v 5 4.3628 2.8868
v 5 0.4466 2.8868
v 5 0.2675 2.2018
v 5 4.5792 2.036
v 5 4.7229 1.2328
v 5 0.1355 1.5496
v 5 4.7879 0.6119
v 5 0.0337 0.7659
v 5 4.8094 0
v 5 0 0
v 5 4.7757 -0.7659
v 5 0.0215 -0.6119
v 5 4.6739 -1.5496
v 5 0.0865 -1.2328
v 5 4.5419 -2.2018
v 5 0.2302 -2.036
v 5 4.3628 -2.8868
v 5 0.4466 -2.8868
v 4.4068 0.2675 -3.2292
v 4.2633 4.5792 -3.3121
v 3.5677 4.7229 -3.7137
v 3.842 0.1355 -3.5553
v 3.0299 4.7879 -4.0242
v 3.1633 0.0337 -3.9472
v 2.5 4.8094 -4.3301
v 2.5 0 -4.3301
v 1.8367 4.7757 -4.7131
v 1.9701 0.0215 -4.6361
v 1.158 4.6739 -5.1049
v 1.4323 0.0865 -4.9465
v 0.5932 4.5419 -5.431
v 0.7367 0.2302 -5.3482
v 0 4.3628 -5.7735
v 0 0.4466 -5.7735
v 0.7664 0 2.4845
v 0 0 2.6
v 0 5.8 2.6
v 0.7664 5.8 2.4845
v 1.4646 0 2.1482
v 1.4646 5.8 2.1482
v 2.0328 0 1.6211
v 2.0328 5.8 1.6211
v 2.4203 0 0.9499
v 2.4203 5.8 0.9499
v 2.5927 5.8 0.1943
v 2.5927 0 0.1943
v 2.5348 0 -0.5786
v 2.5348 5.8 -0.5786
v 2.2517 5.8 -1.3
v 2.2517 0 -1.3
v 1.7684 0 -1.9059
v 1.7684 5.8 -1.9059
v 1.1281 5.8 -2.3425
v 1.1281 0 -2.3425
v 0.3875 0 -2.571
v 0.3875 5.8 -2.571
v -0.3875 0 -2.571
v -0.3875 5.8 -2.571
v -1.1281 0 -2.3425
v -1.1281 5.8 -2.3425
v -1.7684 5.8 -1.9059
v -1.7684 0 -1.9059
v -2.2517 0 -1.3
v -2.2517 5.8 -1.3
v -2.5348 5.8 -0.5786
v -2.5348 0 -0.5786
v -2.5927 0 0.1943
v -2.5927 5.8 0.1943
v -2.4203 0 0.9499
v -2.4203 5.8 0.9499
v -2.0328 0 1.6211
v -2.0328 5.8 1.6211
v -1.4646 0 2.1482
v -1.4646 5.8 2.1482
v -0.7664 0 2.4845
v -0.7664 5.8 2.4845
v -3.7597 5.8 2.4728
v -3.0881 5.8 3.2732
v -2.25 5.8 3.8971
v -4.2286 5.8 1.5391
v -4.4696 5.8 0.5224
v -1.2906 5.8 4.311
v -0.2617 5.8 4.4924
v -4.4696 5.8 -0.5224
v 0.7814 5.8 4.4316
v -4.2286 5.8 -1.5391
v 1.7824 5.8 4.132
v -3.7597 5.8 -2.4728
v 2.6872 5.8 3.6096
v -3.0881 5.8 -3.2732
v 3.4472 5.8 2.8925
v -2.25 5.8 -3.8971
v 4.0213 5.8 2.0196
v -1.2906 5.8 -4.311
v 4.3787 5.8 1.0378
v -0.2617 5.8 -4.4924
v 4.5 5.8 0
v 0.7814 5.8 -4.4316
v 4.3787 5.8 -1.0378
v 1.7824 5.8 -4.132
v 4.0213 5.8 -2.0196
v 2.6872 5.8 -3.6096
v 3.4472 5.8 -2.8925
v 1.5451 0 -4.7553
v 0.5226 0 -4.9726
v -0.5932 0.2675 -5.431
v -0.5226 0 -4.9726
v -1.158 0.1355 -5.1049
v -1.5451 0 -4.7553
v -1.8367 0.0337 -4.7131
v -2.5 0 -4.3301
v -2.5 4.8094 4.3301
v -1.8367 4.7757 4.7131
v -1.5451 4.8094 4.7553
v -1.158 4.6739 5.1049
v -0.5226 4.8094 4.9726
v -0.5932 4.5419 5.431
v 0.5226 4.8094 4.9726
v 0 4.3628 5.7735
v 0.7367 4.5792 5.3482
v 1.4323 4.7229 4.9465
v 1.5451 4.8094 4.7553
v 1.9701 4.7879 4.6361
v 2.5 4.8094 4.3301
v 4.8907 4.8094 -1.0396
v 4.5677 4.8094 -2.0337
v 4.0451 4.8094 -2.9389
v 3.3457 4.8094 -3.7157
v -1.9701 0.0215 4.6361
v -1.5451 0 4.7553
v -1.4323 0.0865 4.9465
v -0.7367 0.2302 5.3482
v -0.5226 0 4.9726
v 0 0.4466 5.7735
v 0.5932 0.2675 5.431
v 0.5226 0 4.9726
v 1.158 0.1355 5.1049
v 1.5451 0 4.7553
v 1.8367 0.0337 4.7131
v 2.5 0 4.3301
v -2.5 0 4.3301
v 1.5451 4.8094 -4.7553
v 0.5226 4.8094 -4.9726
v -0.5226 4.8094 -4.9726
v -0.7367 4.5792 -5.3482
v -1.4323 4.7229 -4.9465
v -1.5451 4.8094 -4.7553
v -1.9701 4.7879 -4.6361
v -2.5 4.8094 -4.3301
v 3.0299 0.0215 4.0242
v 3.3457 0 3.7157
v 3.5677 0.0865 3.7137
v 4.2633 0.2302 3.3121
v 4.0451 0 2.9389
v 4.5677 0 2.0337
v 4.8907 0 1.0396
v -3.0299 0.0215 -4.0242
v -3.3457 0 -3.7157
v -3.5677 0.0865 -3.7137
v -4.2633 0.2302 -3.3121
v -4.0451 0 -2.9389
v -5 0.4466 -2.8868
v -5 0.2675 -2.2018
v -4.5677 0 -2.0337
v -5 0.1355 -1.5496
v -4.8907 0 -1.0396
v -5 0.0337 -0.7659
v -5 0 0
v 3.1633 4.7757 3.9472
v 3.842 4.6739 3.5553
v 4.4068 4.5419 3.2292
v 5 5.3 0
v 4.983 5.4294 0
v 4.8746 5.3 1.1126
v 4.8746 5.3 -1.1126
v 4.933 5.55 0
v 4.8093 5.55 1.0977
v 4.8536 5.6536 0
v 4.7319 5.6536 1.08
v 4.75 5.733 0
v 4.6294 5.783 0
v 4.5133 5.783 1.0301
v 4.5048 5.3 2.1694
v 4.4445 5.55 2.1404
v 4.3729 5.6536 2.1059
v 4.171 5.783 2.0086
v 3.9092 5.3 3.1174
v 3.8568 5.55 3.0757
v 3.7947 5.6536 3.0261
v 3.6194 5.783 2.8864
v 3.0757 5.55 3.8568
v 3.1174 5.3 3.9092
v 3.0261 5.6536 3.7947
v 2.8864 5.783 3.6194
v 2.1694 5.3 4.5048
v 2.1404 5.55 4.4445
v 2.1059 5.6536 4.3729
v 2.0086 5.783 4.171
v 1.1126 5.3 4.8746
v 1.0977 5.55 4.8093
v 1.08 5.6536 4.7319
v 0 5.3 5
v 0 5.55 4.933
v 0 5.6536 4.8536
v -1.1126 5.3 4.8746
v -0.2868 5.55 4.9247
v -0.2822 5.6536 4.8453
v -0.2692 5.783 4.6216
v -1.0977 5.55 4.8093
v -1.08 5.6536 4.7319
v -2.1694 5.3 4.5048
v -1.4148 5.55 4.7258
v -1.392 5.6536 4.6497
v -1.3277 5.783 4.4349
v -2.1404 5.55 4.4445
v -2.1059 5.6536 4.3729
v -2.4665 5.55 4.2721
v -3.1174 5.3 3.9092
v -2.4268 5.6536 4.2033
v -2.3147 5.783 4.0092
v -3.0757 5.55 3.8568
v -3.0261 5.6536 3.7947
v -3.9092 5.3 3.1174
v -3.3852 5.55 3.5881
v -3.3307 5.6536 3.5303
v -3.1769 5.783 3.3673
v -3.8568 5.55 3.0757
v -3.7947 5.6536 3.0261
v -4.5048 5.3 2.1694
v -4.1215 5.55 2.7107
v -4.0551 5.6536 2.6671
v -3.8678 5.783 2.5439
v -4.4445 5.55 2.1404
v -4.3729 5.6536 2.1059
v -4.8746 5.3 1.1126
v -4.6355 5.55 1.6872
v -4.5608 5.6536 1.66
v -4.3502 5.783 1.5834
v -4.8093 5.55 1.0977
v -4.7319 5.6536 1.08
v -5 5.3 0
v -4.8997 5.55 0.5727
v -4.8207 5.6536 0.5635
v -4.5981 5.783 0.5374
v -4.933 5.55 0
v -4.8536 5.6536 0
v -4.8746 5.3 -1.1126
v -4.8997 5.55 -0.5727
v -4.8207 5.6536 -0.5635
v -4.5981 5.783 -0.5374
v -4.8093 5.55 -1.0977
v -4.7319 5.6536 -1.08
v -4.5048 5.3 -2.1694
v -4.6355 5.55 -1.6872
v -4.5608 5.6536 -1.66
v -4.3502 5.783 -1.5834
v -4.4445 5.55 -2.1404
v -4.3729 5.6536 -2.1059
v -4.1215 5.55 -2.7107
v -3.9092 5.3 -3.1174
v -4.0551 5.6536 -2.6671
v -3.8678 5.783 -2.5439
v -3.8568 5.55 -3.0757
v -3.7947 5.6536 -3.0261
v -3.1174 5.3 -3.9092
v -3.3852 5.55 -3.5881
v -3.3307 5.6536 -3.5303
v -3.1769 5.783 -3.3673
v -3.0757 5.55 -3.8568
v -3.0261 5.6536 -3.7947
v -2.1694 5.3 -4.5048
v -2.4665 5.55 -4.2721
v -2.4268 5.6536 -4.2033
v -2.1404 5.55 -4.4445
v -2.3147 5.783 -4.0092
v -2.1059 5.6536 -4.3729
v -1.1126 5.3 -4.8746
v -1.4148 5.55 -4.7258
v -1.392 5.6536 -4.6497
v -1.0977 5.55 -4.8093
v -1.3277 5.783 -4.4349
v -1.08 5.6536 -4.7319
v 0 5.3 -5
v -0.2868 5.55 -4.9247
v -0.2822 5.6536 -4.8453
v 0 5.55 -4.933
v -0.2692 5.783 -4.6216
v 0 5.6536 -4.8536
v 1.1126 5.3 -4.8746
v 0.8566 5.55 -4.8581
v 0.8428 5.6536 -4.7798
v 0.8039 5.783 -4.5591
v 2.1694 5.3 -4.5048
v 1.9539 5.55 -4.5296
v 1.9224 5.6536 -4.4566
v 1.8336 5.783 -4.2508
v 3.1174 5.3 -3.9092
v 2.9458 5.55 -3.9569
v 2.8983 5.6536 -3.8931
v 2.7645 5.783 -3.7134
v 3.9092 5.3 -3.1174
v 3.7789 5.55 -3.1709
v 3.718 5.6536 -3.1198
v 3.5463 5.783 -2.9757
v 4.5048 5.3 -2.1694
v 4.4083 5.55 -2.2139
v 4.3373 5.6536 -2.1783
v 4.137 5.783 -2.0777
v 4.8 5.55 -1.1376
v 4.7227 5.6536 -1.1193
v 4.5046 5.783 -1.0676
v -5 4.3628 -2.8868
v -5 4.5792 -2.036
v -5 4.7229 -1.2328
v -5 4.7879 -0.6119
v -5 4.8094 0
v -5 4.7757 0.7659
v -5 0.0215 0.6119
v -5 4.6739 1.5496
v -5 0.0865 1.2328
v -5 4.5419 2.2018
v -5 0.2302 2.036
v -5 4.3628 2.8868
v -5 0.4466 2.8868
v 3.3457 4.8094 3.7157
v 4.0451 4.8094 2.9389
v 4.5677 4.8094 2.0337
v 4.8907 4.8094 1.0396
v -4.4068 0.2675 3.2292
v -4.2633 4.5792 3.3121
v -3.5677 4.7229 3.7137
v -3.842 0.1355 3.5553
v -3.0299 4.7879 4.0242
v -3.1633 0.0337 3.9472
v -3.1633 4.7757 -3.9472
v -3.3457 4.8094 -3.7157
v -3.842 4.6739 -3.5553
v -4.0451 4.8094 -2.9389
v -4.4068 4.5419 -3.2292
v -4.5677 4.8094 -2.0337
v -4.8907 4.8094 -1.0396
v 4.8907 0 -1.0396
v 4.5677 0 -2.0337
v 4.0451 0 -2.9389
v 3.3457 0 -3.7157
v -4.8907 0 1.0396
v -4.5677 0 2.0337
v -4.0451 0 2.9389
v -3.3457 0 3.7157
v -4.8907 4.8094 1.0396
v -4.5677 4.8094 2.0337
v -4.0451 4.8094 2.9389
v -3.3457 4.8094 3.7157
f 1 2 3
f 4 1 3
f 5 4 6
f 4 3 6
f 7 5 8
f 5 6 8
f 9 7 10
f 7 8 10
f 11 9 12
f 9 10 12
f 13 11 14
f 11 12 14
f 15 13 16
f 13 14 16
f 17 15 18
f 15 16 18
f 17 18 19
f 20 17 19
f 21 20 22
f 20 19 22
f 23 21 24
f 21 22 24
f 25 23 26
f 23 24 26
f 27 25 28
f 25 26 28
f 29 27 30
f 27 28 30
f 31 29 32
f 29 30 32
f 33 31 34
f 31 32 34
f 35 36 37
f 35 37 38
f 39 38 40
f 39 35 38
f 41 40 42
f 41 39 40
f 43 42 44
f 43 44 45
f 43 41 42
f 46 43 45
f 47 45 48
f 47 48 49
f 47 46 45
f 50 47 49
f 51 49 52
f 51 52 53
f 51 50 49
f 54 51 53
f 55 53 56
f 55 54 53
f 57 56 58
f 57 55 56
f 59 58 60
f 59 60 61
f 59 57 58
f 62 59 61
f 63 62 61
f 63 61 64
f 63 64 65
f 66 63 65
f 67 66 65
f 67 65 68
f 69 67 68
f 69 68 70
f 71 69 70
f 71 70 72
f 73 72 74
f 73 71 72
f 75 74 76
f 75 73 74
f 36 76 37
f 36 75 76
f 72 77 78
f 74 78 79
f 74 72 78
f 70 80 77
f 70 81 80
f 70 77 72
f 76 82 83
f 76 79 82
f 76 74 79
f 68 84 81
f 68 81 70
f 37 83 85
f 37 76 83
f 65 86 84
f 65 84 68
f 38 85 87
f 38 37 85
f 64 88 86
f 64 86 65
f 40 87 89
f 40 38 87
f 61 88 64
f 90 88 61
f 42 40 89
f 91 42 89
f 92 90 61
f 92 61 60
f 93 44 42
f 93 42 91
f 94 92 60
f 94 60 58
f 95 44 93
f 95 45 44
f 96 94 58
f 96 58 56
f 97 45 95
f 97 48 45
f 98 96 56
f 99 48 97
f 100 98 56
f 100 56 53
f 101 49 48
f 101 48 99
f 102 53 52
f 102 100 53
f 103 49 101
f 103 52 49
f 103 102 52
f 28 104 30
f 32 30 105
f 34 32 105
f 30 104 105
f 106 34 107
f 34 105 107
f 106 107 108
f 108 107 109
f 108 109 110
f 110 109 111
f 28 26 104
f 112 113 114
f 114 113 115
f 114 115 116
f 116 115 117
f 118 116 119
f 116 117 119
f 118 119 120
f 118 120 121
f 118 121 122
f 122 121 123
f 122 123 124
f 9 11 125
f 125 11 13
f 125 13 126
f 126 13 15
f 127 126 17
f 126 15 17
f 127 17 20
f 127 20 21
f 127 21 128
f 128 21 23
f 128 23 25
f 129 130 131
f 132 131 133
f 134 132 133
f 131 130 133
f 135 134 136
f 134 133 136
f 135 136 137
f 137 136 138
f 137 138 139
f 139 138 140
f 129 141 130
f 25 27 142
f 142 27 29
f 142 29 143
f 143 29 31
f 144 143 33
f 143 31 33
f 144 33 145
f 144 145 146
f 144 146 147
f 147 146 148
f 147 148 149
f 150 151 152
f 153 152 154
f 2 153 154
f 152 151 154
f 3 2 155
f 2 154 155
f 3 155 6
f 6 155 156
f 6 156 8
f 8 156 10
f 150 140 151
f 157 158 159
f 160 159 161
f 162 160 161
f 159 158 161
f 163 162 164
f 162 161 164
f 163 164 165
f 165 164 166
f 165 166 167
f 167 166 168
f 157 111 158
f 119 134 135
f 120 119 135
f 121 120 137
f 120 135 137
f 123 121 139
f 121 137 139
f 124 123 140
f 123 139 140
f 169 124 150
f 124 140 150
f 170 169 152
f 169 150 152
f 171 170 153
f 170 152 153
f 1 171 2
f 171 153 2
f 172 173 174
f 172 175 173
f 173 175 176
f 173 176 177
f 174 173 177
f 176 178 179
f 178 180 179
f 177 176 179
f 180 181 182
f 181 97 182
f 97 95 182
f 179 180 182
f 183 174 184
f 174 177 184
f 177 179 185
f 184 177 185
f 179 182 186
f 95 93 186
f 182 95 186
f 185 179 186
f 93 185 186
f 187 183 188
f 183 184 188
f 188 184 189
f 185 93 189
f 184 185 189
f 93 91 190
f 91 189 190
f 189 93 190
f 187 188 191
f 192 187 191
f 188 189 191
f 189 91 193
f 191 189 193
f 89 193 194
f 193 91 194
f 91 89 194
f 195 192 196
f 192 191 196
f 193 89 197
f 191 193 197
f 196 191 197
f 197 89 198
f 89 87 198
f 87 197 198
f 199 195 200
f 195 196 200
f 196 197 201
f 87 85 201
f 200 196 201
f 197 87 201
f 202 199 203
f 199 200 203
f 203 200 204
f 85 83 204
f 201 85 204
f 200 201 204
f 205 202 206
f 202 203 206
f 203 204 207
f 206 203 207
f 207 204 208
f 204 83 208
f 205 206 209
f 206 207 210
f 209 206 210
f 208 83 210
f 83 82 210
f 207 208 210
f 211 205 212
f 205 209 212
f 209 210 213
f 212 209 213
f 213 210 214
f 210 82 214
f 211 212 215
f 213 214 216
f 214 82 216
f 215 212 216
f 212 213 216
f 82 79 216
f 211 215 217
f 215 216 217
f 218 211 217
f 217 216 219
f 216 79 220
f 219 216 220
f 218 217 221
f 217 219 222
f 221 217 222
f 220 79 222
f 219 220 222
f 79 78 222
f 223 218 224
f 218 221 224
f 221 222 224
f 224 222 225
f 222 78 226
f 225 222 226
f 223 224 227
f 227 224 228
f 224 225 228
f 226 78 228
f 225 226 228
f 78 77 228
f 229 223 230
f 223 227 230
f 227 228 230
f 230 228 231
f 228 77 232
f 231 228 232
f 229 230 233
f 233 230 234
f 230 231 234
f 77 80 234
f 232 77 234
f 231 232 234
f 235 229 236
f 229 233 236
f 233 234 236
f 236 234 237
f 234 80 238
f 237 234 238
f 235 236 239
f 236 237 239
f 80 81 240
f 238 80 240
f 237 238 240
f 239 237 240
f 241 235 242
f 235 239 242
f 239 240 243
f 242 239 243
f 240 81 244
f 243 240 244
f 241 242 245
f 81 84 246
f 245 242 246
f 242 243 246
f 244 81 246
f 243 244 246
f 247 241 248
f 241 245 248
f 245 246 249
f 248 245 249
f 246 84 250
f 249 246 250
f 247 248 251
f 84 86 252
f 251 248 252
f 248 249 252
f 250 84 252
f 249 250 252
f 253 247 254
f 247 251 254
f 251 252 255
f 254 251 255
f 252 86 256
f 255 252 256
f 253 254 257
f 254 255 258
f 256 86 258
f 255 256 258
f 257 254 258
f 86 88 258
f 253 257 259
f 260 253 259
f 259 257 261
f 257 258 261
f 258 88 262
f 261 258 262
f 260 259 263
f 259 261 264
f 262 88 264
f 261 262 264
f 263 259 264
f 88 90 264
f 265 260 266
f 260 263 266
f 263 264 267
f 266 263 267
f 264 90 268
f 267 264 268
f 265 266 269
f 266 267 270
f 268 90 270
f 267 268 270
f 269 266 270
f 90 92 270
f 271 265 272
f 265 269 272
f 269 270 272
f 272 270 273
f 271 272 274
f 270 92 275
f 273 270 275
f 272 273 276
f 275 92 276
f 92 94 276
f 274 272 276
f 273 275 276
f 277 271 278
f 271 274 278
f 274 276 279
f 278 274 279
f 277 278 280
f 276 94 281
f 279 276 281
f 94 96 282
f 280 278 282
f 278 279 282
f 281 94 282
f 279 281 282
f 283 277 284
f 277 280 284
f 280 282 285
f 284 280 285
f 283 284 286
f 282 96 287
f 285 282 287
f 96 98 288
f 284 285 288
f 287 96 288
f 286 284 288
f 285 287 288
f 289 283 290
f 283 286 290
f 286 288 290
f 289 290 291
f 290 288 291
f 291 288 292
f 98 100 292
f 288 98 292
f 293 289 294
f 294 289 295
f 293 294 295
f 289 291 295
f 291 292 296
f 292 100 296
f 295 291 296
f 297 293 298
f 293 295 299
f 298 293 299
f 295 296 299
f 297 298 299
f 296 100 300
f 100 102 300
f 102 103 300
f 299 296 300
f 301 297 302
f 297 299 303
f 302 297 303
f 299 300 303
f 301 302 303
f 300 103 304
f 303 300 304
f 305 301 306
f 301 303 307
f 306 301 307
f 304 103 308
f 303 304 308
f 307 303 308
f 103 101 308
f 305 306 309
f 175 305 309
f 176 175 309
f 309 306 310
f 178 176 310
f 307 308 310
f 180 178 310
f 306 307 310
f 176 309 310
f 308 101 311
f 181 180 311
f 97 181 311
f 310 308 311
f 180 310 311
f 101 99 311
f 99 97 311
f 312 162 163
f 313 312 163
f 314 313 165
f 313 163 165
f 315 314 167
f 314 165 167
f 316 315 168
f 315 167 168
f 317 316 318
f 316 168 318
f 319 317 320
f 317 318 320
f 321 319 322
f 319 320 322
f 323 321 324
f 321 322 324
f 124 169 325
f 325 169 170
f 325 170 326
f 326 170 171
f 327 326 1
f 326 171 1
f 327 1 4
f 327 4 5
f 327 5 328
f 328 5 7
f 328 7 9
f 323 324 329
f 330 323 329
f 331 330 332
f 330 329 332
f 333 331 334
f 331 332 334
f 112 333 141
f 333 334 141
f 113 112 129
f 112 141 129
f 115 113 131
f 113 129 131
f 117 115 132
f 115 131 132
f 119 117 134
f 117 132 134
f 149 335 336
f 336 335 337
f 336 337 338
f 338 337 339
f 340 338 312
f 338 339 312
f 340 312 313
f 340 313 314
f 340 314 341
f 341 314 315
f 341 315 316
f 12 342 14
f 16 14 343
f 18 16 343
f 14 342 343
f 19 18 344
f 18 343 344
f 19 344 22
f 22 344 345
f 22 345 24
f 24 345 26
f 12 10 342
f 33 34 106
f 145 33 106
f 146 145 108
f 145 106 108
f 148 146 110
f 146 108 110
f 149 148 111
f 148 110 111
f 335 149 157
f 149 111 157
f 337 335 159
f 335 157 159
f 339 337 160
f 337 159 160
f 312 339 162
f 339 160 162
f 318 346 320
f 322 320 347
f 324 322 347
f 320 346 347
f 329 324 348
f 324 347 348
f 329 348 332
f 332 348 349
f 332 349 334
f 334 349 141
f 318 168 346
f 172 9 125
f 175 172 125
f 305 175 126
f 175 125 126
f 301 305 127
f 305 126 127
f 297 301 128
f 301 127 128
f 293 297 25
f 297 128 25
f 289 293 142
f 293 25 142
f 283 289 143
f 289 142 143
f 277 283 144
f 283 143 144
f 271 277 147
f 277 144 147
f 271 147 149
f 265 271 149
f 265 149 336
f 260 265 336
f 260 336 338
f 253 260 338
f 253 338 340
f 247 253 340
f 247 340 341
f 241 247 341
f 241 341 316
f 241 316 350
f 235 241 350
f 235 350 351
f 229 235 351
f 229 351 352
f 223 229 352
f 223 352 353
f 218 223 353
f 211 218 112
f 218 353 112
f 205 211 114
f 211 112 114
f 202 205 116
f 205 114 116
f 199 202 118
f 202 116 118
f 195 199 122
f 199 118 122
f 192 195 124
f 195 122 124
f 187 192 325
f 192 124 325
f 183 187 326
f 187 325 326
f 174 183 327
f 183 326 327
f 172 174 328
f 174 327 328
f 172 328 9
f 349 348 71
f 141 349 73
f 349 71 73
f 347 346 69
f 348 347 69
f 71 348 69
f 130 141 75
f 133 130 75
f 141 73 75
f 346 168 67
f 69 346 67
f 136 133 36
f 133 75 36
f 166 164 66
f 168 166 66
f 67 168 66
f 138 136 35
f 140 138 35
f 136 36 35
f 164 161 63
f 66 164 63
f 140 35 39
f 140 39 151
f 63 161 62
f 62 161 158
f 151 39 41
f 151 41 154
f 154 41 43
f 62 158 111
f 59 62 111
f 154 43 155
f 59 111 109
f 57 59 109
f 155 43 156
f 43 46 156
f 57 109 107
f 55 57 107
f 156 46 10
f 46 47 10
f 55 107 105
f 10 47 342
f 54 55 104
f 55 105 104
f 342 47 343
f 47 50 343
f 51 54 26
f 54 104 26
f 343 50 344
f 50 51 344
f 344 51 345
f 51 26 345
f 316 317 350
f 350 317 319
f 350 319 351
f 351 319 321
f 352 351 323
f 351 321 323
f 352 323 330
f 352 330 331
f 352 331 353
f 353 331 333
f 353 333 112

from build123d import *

# Parameters (mm, degrees)
SKETCH1_R      = 2.6
EXTRUDE1_DEPTH = 5.8
SKETCH2_W      = 2
SKETCH2_H      = 1
FILLET1_R      = 0.5


with BuildPart() as part:
    # Sketch1 → Extrude1 (new body)
    with BuildSketch(Plane(origin=(0, 0, 0), x_dir=(1, 0, 0), z_dir=(0, 1, 0))):
        Polygon((0, -5.773502692), (5, -2.886751346), (5, 2.886751346), (0, 5.773502692), (-5, 2.886751346), (-5, -2.886751346), align=None)
        with Locations(Location((0, 0, 0), (0, 0, 270))):
            Circle(SKETCH1_R, mode=Mode.SUBTRACT)
    extrude(amount=EXTRUDE1_DEPTH)

    # Sketch2 → Cut-Revolve1 (revolve, cut)
    with BuildSketch(Plane.XY, mode=Mode.PRIVATE) as cut_revolve1_sk:
        Polygon((-5, 5.8), (-5, 4.809401077), (-9, 2.5), (-9, 5.8), align=None)
        with Locations((-1, 5.3)):
            Rectangle(SKETCH2_W, SKETCH2_H)
        Polygon((-5, 0), (-9, 0), (-9, 2.309401077), align=None)
    revolve(cut_revolve1_sk.sketch.rotate(Axis((0, 0, 0), (0, 1, 0)), 180), axis=Axis((0, 0, 0), (0, 1, 0)), mode=Mode.SUBTRACT)

    # Fillet1
    fillet1_edges = [part.edges().sort_by_distance(p)[0] for p in [
        (-5, 5.8, 0),
    ]]
    fillet(fillet1_edges, radius=FILLET1_R)


solid = part.part
